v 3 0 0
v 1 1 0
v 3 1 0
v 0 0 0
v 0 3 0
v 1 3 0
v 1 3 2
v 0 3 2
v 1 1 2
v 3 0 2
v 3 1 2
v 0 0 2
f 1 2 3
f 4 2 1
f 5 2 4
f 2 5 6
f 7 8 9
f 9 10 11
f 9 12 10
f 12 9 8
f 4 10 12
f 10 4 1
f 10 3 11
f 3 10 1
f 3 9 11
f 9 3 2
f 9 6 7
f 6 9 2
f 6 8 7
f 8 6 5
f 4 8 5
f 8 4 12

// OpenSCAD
polyhedron(
    points=[[0,0,0], [3,0,0], [3,1,0], [1,1,0], [1,3,0], [0,3,0],
            [0,0,2], [3,0,2], [3,1,2], [1,1,2], [1,3,2], [0,3,2]],
    faces=[[0,1,2,3,4,5], [11,10,9,8,7,6], [6,7,1,0], [7,8,2,1],
           [8,9,3,2], [9,10,4,3], [10,11,5,4], [11,6,0,5]]
);
